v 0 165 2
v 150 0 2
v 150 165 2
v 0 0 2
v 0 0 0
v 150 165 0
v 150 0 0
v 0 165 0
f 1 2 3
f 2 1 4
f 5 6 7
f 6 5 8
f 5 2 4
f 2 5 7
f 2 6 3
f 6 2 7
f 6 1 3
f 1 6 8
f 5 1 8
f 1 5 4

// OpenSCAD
module piece_tray() {
    translate([0,0,0]) cube([150, 165, 2]);
}

piece_tray();
